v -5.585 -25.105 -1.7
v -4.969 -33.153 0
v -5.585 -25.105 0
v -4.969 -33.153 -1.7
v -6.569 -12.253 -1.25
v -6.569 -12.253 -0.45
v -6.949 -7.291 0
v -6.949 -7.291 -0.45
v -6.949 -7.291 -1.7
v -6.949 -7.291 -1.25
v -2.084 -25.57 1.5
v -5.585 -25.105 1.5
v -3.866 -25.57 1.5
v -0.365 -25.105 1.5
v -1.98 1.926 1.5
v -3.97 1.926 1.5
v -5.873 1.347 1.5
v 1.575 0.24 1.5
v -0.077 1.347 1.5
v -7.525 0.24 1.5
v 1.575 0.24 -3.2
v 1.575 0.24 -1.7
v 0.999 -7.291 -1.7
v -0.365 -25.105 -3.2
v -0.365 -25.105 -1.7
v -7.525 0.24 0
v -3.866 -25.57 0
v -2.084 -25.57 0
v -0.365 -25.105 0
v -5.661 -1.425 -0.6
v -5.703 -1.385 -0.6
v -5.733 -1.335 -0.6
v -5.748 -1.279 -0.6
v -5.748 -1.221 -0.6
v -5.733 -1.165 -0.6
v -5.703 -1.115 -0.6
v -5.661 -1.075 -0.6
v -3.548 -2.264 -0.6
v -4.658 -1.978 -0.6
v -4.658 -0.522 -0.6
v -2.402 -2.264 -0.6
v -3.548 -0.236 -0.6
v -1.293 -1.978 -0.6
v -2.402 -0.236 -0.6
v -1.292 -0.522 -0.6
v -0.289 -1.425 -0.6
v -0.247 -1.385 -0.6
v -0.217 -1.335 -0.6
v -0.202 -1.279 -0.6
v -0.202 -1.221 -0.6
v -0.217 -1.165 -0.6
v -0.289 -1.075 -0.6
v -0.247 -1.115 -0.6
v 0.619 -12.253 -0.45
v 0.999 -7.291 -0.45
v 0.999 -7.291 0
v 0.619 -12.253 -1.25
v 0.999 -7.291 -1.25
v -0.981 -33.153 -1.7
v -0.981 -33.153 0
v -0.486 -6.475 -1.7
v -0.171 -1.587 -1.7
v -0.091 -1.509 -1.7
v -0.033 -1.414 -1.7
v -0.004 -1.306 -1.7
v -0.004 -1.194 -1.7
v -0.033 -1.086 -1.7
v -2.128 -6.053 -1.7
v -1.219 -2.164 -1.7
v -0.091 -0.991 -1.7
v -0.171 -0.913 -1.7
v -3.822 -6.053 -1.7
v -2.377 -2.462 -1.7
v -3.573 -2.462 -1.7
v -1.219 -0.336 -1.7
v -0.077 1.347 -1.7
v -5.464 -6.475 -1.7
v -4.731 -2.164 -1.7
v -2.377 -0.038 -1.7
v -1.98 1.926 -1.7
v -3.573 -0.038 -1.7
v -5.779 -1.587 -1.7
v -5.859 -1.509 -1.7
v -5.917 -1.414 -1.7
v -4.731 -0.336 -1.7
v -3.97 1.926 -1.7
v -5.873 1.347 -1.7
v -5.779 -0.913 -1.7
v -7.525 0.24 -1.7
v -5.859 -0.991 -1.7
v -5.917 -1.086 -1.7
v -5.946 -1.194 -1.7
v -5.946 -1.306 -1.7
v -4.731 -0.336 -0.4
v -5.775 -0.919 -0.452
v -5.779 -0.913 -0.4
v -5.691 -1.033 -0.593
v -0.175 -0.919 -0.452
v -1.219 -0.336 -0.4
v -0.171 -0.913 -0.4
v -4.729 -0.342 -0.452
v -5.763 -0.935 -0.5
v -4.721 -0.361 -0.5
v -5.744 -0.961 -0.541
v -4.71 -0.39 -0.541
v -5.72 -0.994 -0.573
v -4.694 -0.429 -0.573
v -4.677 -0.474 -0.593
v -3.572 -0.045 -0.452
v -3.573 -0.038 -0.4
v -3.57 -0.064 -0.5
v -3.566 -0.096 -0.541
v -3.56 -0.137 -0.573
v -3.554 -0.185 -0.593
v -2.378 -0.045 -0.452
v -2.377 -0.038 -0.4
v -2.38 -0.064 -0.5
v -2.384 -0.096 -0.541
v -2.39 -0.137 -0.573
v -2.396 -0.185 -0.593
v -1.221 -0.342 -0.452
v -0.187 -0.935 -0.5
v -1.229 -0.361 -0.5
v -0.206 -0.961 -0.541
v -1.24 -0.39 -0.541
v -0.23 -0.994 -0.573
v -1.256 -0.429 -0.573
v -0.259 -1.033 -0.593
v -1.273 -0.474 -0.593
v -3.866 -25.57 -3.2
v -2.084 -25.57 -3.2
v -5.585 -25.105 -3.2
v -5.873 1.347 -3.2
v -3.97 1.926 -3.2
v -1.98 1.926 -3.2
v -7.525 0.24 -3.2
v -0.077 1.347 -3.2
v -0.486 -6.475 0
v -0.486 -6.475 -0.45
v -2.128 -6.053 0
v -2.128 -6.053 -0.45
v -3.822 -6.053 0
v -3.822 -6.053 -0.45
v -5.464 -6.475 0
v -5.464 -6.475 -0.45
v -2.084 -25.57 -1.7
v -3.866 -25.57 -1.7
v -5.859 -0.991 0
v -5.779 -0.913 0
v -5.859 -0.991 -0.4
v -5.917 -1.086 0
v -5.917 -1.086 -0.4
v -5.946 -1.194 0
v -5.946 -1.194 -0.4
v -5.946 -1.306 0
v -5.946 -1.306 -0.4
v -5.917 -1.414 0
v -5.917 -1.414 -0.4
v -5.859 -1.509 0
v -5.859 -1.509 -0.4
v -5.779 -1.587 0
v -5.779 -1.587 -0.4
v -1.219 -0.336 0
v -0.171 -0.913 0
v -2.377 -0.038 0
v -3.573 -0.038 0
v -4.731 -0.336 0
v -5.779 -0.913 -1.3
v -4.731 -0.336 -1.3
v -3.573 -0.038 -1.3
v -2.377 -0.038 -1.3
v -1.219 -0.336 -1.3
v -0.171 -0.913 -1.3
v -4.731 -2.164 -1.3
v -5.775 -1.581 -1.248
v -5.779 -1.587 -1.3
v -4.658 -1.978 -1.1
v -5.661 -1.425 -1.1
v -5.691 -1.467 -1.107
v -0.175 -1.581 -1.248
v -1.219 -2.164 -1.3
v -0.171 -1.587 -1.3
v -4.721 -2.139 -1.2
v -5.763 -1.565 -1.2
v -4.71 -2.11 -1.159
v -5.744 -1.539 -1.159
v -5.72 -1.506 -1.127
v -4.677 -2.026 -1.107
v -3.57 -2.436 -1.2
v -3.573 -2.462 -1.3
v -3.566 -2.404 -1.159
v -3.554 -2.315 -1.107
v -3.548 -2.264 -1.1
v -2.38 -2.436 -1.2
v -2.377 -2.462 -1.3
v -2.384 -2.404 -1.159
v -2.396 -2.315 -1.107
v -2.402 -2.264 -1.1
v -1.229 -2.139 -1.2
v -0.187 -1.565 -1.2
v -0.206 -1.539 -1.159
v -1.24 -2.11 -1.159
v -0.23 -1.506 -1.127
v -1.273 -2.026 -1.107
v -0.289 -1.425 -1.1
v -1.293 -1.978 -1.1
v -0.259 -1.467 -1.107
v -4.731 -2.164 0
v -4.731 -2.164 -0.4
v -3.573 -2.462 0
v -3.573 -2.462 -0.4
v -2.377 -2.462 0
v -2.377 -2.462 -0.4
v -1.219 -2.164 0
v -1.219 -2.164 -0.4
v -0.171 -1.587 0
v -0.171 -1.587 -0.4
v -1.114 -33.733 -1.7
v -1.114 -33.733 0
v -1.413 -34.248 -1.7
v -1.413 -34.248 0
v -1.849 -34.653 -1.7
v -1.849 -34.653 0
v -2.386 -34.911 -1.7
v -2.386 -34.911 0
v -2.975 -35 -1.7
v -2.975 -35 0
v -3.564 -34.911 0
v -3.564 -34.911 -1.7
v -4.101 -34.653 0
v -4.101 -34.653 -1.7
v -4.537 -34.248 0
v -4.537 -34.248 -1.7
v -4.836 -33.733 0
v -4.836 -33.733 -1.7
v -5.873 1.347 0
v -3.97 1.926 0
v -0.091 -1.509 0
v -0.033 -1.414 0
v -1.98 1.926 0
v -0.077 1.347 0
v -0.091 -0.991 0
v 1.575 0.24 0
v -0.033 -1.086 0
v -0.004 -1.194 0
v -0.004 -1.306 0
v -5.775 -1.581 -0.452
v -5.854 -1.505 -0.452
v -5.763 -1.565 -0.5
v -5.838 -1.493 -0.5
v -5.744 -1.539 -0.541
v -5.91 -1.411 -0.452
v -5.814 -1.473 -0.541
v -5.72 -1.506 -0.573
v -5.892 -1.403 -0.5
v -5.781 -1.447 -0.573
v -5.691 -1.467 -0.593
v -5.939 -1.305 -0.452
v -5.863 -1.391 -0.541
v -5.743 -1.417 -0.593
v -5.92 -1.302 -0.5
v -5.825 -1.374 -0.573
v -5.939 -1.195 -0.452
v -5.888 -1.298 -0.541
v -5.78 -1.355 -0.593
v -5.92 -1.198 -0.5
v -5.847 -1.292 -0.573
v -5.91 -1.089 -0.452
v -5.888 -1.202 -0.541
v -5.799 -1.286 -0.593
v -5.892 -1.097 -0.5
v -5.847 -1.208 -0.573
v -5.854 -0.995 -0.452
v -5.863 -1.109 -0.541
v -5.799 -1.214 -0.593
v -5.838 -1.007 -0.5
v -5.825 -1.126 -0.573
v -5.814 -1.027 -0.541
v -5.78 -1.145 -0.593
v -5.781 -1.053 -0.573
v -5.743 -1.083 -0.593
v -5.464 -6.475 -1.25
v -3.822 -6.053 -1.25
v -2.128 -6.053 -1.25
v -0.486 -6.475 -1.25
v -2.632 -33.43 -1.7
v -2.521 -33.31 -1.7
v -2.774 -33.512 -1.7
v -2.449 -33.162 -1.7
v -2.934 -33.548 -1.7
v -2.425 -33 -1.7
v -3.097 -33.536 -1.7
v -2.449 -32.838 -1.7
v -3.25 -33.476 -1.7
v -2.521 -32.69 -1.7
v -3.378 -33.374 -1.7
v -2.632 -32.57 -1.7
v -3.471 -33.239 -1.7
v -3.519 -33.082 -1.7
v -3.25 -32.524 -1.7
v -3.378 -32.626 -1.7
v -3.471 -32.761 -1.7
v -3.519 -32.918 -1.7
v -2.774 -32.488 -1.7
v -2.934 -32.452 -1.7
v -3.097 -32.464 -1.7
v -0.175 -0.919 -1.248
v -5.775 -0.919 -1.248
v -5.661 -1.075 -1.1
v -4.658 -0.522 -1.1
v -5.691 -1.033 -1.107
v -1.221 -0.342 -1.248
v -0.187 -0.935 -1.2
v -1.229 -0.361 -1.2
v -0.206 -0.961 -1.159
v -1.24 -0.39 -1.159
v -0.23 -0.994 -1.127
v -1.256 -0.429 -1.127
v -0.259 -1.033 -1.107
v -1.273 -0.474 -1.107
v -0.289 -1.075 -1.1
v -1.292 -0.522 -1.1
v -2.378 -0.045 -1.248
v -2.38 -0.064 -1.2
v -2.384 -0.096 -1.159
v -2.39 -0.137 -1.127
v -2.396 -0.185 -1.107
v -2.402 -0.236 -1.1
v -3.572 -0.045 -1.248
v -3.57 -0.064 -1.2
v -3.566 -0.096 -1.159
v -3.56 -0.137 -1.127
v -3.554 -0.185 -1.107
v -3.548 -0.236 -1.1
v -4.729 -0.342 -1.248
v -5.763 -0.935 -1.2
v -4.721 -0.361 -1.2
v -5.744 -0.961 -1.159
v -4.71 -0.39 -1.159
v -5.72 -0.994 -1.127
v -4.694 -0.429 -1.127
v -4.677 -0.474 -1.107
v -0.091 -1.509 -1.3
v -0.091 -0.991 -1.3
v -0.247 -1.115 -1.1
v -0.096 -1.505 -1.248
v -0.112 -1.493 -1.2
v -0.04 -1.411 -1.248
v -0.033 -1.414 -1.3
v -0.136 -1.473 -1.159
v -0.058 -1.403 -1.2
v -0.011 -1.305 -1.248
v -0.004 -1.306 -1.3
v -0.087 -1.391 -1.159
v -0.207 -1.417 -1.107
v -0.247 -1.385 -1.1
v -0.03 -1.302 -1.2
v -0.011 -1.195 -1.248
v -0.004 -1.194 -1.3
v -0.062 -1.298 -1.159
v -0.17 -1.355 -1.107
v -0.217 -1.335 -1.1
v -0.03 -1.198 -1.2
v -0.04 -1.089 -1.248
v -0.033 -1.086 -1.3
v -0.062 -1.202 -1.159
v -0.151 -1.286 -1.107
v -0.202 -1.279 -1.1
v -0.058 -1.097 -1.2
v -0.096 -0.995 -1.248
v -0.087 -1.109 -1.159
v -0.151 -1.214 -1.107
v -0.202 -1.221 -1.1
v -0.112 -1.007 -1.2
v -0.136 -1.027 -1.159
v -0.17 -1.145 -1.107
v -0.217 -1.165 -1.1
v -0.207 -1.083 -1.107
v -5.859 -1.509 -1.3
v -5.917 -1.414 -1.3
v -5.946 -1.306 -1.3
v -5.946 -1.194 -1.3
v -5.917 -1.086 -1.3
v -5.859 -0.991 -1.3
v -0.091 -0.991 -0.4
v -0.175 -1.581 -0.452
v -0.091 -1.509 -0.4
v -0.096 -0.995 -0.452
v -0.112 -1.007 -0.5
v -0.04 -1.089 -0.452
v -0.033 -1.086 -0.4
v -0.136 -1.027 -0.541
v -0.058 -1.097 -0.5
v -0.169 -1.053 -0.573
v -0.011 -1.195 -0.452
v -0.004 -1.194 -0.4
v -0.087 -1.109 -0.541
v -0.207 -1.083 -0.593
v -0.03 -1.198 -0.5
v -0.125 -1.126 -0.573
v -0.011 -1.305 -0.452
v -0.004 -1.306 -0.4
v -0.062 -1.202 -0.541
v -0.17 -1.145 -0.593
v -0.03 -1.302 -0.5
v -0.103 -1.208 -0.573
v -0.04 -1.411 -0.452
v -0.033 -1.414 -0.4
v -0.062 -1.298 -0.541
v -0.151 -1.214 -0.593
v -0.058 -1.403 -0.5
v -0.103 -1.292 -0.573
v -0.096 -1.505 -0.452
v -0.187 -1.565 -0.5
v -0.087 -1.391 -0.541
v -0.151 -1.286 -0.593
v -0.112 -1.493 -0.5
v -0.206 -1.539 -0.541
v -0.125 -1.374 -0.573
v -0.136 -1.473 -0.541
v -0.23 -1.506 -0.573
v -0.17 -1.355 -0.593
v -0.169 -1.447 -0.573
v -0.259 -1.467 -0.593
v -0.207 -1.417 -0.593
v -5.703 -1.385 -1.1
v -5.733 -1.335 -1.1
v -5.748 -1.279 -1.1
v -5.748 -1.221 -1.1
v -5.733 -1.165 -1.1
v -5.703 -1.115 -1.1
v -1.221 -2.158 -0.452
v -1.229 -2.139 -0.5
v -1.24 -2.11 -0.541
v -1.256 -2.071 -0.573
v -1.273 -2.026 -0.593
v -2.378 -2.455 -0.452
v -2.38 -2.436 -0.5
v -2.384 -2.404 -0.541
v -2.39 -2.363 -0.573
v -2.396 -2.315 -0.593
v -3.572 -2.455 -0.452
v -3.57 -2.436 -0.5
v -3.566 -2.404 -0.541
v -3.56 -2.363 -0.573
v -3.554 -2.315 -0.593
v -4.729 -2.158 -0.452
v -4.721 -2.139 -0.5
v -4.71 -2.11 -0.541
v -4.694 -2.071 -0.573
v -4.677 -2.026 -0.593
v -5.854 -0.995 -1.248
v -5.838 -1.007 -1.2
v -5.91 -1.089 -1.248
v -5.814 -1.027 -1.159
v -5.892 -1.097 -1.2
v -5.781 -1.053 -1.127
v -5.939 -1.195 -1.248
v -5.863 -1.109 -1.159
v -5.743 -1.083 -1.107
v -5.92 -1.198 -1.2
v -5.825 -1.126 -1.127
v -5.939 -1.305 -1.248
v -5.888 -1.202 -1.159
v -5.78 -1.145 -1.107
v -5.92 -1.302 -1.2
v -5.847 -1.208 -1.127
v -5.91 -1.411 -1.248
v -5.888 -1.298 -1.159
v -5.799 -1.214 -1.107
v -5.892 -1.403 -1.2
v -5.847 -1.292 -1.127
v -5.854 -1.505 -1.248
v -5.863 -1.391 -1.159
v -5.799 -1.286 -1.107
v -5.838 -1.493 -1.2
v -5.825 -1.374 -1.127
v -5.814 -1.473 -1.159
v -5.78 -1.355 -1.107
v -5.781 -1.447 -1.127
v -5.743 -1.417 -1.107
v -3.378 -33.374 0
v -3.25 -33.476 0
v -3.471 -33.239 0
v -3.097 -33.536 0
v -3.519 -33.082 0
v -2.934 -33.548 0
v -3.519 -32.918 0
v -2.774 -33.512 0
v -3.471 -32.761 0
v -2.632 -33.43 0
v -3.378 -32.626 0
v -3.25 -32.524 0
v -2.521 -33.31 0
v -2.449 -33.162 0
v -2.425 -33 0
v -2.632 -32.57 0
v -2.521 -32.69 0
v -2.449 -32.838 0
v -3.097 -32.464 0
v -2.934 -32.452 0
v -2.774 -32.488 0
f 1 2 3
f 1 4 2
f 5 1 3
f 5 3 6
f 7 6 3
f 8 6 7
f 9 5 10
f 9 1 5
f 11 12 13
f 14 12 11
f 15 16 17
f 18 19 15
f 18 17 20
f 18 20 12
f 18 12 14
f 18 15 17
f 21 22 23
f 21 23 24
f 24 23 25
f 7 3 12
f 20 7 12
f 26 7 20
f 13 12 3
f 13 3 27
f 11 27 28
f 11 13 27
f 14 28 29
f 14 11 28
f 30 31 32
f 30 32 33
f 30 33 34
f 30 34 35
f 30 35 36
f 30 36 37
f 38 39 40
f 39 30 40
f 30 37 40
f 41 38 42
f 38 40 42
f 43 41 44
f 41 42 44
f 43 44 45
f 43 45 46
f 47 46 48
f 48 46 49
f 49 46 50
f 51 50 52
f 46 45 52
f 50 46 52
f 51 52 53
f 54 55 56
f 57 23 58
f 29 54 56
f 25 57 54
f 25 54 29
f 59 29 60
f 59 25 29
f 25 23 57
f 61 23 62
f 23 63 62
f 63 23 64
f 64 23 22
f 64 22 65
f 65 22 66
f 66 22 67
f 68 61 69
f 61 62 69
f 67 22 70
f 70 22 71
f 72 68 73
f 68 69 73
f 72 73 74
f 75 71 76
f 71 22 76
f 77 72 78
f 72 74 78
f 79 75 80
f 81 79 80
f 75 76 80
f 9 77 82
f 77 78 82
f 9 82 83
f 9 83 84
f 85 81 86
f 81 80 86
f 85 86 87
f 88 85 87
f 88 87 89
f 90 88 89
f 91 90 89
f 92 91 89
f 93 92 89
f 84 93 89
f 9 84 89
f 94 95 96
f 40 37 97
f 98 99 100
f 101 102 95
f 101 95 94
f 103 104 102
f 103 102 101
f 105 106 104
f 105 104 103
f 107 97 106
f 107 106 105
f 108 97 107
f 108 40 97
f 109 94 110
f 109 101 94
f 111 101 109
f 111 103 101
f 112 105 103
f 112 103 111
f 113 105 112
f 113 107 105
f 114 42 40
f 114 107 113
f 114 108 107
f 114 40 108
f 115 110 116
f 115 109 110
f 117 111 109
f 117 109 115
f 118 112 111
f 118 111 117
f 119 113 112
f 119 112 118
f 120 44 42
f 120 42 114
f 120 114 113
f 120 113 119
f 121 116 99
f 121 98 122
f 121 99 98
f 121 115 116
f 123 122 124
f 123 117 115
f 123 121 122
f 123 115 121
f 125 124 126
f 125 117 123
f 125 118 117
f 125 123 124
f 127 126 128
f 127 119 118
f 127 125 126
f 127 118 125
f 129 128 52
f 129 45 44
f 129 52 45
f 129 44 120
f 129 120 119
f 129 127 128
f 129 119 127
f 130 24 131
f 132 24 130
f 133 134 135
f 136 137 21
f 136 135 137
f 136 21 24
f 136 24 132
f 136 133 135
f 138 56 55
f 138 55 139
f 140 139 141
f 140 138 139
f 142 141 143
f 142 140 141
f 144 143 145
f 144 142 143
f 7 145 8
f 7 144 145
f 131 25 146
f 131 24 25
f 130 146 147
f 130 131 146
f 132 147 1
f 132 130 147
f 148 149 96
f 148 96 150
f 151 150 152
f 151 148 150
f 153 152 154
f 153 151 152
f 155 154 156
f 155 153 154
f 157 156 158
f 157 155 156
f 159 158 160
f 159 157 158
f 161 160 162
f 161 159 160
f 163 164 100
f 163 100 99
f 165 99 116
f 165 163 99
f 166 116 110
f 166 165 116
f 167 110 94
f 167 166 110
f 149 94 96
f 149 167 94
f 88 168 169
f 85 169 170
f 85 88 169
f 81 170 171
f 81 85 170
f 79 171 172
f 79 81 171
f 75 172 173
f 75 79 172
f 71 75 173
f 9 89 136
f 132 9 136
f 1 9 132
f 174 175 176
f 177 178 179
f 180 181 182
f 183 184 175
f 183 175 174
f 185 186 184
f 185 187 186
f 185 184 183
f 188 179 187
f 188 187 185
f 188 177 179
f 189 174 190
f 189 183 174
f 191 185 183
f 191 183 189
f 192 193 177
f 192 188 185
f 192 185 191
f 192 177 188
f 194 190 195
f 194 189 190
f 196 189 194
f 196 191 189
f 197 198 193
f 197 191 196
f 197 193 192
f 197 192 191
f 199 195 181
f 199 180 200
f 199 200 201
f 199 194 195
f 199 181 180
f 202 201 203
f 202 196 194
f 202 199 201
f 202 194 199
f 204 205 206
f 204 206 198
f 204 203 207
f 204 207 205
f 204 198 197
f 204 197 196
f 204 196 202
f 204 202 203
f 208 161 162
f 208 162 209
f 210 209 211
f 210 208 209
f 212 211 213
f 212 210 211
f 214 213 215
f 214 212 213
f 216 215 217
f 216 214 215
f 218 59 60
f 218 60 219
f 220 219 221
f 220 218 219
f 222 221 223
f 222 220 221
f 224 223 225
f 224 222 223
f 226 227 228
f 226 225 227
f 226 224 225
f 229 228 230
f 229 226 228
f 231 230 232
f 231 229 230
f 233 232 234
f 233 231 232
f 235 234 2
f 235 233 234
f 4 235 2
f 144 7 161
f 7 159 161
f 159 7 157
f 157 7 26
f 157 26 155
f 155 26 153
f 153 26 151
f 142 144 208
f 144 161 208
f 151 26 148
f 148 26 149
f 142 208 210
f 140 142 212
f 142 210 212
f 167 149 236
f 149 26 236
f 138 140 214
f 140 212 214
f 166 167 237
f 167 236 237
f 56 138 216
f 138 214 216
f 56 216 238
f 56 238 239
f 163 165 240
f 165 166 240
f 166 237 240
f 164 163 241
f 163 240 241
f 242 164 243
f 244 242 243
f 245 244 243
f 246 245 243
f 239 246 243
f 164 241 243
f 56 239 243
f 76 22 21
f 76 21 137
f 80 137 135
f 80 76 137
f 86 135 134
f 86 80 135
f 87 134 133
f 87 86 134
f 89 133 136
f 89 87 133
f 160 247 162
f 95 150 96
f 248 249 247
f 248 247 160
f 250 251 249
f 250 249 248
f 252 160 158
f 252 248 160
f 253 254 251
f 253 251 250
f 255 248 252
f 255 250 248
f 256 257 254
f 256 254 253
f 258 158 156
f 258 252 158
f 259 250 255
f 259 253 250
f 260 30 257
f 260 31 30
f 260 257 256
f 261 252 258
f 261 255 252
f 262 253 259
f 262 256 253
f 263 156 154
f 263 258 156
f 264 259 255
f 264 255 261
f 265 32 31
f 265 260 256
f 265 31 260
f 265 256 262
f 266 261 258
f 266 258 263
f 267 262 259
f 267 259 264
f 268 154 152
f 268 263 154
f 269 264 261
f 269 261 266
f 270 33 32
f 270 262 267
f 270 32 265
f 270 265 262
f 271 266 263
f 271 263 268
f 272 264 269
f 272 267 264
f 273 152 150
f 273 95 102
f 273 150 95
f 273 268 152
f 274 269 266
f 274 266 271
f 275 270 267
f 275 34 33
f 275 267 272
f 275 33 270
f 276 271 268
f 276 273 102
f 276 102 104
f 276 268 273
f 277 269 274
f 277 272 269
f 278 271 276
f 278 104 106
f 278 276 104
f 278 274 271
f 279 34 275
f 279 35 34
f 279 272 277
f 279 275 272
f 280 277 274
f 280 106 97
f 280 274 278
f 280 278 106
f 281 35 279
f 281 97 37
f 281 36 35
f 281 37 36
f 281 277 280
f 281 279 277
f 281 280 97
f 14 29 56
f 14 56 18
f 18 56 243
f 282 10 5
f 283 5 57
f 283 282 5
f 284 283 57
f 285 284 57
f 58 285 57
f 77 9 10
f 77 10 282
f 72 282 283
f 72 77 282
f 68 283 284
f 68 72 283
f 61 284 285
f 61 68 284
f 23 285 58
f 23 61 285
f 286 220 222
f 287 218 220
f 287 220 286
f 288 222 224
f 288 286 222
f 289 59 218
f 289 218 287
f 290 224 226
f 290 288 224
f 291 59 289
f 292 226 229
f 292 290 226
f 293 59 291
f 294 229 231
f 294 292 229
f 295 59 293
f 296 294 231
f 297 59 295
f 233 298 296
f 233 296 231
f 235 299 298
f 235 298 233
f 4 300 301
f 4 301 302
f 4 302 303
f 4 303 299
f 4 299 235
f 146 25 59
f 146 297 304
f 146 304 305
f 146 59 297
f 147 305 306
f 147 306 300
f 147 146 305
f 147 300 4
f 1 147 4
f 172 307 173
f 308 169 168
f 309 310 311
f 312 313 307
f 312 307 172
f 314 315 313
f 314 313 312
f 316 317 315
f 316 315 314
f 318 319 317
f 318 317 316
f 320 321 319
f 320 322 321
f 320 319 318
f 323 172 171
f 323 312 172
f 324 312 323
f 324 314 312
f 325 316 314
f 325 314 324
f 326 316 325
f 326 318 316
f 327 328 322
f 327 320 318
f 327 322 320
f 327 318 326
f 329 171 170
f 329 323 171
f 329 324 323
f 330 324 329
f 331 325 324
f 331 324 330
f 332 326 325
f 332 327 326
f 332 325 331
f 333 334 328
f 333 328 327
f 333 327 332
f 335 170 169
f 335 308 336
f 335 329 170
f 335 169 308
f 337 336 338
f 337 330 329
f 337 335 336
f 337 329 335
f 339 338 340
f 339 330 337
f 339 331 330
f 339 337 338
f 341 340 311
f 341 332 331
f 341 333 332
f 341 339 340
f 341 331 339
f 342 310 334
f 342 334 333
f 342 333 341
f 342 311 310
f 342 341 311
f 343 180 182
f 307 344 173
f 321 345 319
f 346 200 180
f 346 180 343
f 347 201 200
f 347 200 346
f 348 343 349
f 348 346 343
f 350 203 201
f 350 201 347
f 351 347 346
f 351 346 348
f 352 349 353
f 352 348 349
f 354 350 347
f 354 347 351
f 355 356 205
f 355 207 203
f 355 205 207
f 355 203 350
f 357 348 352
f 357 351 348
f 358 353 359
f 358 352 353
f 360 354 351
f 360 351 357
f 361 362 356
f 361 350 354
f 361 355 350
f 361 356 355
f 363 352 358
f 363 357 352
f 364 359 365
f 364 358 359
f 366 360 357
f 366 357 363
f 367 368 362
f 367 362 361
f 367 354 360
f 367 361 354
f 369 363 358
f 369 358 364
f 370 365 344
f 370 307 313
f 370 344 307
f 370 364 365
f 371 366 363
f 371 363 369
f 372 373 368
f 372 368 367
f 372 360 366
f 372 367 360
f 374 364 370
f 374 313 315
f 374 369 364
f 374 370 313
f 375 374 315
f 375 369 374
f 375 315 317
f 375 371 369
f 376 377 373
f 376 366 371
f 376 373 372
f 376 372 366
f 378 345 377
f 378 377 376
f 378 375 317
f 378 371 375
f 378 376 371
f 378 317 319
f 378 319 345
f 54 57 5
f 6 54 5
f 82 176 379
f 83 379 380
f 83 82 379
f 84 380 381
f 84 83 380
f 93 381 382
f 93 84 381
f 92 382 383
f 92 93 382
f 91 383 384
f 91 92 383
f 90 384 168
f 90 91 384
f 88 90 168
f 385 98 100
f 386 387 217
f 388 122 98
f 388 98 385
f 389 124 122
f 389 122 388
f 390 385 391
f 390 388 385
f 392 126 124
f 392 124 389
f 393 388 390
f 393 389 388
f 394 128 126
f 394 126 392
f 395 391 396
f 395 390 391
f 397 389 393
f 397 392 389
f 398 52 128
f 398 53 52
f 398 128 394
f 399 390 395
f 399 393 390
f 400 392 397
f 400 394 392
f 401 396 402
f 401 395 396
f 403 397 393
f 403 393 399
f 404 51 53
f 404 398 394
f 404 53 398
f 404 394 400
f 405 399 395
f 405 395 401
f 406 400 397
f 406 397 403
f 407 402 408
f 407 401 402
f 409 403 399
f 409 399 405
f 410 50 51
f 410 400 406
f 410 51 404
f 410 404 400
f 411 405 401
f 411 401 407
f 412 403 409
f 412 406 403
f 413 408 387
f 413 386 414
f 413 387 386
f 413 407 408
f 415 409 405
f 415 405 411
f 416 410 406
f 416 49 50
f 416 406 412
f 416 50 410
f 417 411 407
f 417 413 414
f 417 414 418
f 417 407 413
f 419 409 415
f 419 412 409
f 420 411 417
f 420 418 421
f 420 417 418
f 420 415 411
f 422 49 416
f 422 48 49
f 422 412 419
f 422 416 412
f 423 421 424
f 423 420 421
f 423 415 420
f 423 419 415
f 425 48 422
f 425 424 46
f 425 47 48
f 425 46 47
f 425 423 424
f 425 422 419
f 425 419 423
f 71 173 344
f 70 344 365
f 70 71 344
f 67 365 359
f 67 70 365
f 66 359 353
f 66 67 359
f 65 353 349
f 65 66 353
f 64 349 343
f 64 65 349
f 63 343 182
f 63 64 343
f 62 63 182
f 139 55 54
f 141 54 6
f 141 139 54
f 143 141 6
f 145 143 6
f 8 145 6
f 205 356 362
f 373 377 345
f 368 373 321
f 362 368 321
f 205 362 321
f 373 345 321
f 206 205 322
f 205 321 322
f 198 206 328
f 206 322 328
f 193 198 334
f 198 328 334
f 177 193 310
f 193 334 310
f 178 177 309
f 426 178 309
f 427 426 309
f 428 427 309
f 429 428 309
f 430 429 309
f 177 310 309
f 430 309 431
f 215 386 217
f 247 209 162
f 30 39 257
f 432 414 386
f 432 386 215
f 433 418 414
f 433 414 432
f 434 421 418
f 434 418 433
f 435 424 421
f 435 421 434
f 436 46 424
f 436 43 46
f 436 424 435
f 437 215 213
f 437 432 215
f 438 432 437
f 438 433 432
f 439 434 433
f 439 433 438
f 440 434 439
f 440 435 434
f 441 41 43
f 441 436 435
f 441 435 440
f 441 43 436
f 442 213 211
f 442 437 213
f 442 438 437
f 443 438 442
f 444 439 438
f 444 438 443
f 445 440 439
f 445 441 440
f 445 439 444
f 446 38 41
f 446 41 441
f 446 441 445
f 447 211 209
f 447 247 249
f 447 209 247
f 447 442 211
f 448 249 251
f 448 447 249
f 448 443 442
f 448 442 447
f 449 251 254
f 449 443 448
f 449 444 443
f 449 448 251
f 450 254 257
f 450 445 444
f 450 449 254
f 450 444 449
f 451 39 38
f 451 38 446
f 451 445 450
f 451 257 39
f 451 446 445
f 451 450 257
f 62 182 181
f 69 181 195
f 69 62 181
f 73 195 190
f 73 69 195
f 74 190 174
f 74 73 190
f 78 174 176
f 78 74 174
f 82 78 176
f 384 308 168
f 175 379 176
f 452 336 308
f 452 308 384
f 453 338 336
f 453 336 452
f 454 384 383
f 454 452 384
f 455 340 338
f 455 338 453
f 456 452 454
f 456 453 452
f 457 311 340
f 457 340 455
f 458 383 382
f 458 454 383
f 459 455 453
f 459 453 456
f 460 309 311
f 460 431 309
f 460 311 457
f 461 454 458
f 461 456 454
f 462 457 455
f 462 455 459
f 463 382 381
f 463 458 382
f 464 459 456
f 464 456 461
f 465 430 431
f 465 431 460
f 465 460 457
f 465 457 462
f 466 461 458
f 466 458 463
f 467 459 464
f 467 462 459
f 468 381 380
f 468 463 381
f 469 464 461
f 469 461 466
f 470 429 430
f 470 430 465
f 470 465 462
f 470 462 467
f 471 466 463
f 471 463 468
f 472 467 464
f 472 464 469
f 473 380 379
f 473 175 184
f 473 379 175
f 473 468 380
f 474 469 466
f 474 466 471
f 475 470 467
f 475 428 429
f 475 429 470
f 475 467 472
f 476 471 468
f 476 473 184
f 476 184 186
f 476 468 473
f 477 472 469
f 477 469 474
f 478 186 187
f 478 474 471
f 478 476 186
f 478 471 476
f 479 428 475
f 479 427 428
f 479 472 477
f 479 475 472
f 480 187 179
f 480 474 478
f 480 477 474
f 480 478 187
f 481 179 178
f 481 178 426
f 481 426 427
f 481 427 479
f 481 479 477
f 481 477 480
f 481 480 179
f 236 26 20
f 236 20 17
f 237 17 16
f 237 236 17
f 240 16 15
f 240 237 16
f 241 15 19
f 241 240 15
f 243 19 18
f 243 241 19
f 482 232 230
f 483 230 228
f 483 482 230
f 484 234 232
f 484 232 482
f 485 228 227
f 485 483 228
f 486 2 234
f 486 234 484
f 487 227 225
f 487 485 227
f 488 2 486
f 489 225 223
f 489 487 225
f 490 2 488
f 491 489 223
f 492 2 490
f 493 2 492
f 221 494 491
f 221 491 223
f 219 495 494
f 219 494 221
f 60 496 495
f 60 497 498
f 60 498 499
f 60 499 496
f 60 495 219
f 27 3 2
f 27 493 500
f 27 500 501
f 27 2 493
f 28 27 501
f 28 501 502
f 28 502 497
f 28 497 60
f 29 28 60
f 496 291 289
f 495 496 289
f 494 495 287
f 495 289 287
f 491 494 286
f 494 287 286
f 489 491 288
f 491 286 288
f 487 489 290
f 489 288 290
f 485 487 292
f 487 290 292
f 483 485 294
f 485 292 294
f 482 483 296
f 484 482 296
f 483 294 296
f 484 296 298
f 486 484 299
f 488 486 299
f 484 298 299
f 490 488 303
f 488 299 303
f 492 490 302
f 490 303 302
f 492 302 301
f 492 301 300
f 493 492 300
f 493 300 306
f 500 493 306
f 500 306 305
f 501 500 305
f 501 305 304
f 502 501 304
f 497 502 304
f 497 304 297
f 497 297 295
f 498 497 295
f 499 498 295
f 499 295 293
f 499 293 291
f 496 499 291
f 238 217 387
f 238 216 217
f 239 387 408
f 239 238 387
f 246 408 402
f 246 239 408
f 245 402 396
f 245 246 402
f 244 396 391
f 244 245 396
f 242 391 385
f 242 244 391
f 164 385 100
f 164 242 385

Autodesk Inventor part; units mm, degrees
ref_plane "YZ Plane" through (0, 0, 0) normal (1, 0, 0) x (0, 1, 0)
ref_plane "XZ Plane" through (0, 0, 0) normal (0, 1, 0) x (-1, 0, 0)
sketch "Sketch1" plane through (0, 0, 0) normal (0, 0, 1) x (1, 0, 0)
  arc A0 (-0.1713, -0.9133) -> (-5.7787, -0.9133) centre (-2.975, -4.7604) ccw
  arc A1 (-5.7787, -1.5867) -> (-0.1713, -1.5867) centre (-2.975, 2.2604) ccw
  circle A2 centre (-5.5333, -1.25) radius 0.4167
  circle A3 centre (-0.4167, -1.25) radius 0.4167
  line L0 (-5.95, 0) -> (0, 0)
  line L1 (0, 0) -> (0, -2.5)
  line L2 (0, -2.5) -> (-5.95, -2.5)
  line L3 (-5.95, -2.5) -> (-5.95, 0)
  point P0 (-1.5, -3.25)
  dimension "d8" = 4.7604
  dimension "d11" = 0.8333
  dimension "d12" = 5.95
  dimension "d13" = 2.5
  dimension "d14" = 0.8333
  dimension "d22" = 4.7604
extrude "Extrusion1" add sketch "Sketch1" against normal blind 0.6 contours A3 A1 A2 A0 | A3 | A2
sketch "Sketch2" plane through (0, 0, 0) normal (0, 0, 1) x (1, 0, 0)
  arc A0 (-0.1713, -0.9133) -> (-5.7787, -0.9133) centre (-2.975, -4.7604) ccw projected
  arc A1 (1.575, 0.2396) -> (-7.525, 0.2396) centre (-2.975, -4.7604) ccw
  line L0 (-4.9692, -33.1526) -> (-7.525, 0.2396)
  line L1 (-0.9808, -33.1526) -> (1.575, 0.2396)
  circle A2 centre (-2.975, -33) radius 2
  arc A3 (-0.1713, -0.9133) -> (-5.7787, -0.9133) centre (-2.975, -4.7604) ccw projected
  line L2 (-11.9492, 2) -> (-1.5879, 2) construction
  point P0 (-7.5, -3.25)
  dimension "d15" = 33.4899
  dimension "d16" = 2
  dimension "d17" = 33.4899
  dimension "d19" = 4
  dimension "d20" = 9.1
  dimension "d21" = 35
extrude "Extrusion2" add sketch "Sketch2" along normal blind 1.5
sketch "Sketch4" plane through (0, 0, 0) normal (0, 0, -1) x (-1, 0, 0)
  arc A0 (7.525, 0.2396) -> (-1.575, 0.2396) centre (2.975, -4.7604) ccw projected
  line L0 (4.6338, -2.5) -> (0.9036, -2.5) construction
  line L1 (4.4698, -6) -> (1.0404, -6) construction
  arc A1 (0.1713, -1.5867) -> (5.7787, -1.5867) centre (2.975, 2.2604) ccw construction
  line L2 (7.525, 0.2396) -> (4.9692, -33.1526) construction
  line L3 (0.9808, -33.1526) -> (-1.575, 0.2396) construction
  arc A2 (6.9486, -7.2911) -> (-0.9986, -7.2911) centre (2.975, -12.7604) ccw
  line L4 (7.525, 0.2396) -> (4.9692, -33.1526) construction
  line L5 (0.9808, -33.1526) -> (-1.575, 0.2396) construction
  arc A3 (0.9808, -33.1526) -> (4.9692, -33.1526) centre (2.975, -33) ccw projected
  line L6 (6.9486, -7.2911) -> (4.9692, -33.1526)
  line L7 (0.9808, -33.1526) -> (-0.9986, -7.2911)
  point P0 (0, 0)
  dimension "d23" = 3.5
  dimension "d24" = 6.7604
  dimension "d25" = 6.7604
extrude "Extrusion4" add sketch "Sketch4" along normal blind 0.85
sketch "Sketch7" plane through (0, 0, -0.85) normal (0, 0, -1) x (-1, 0, 0)
  arc A0 (6.9486, -7.2911) -> (-0.9986, -7.2911) centre (2.975, -12.7604) ccw projected
  line L0 (-0.9986, -7.2911) -> (0.9808, -33.1526) projected
  arc A1 (0.9808, -33.1526) -> (4.9692, -33.1526) centre (2.975, -33) ccw projected
  line L1 (4.9692, -33.1526) -> (6.9486, -7.2911) projected
  line L2 (-0.6188, -12.2527) -> (6.5688, -12.2527)
  point P0 (0, 0)
extrude "Extrusion7" cut sketch "Sketch7" against normal blind 0.4 contours L1 L2 L0 A0
sketch "Sketch3" plane through (0, 0, 1.5) normal (0, 0, 1) x (1, 0, 0)
  arc A0 (-4.9692, -33.1526) -> (-0.9808, -33.1526) centre (-2.975, -33) ccw projected
  circle A1 centre (-2.975, -33) radius 0.55
  point P0 (0, 0)
  dimension "d5" = 1.1
extrude "Extrusion3" cut sketch "Sketch3" against normal through all
ref_plane "Work Plane1" through (-4.9692, -33.1526, -0.85) normal (0, 0, -1) x (-1, 0, 0)
mirror "Mirror1" about plane through (-2.975, -19.8303, -0.85) normal (0, 0, -1) of "Extrusion1", "Extrusion2", "Extrusion4", "Extrusion3", "Extrusion7"
sketch "Sketch8" plane through (-2.975, -4.7604, -3.2) normal (0, 0, -1) x (-1, 0, 0)
  circle A0 centre (0, -28.2396) radius 0.55 projected
  arc A1 (-1.9942, -28.3923) -> (1.9942, -28.3923) centre (0, -28.2396) ccw projected
  line L0 (4.55, 5) -> (1.9942, -28.3923) projected
  arc A2 (4.55, 5) -> (-4.55, 5) centre (0, 0) ccw projected
  line L1 (-1.9942, -28.3923) -> (-4.55, 5) projected
  line L2 (-1.9942, -28.3923) -> (-4.55, 5) projected
  line L3 (4.55, 5) -> (1.9942, -28.3923) projected
  arc A3 (-2.6101, -20.3444) -> (2.6101, -20.3444) centre (0, -14.1082) ccw
  point P0 (-2.975, 4.7604)
  dimension "d37" = 6.7604
  dimension "d38" = 6.7604
extrude "Extrusion8" cut sketch "Sketch8" against normal blind 1.5 contours L1 A3 L0 A1
mirror "Mirror2" about plane through (-4.9692, -33.1526, -0.85) normal (0, 0, -1) of "Extrusion8"
fillet "Fillet1" radius 0.2 8 edges at (-2.975, 0, -0.6) (0, -1.25, -0.6) (-2.975, -2.5, -0.6) (-5.95, -1.25, -0.6) (-2.975, 0, -1.1) (0, -1.25, -1.1) (-2.975, -2.5, -1.1) (-5.95, -1.25, -1.1)
sketch "Sketch6" plane through (-2.975, -4.7604, -3.2) normal (0, 0, -1) x (-1, 0, 0)
  line L0 (-1.9942, -28.3923) -> (-4.55, 5) projected
  line L1 (4.55, 5) -> (1.9942, -28.3923) projected
  arc A0 (-2.5344, -21.3343) -> (2.5344, -21.3343) centre (0, -18.2396) ccw
  circle A1 centre (0, -28.2396) radius 0.55 projected
  arc A2 (-1.9942, -28.3923) -> (1.9942, -28.3923) centre (0, -28.2396) ccw projected
  point P0 (-2.975, 4.7604)
  dimension "d31" = 4
  dimension "d32" = 10
equation "\"d11\" = 0.333333 * d13"
equation "\"d12\" = phheight"
equation "\"d13\" = phwidth"
equation "\"d14\" = d11"
equation "\"d22\" = d8"
equation "\"d16\" = phtosolid"
equation "\"d17\" = d15"
equation "\"d20\" = pheight"
equation "\"d24\" = d25"
equation "\"d37\" = d38"
equation "\"phtofree\" = 2.5"
equation "\"phtosolid\" = 2"
equation "\"phheight\" = 5.95"
equation "\"phwidth\" = 2.5"
equation "\"pheight\" = 9.1"
properties part number "poker"
